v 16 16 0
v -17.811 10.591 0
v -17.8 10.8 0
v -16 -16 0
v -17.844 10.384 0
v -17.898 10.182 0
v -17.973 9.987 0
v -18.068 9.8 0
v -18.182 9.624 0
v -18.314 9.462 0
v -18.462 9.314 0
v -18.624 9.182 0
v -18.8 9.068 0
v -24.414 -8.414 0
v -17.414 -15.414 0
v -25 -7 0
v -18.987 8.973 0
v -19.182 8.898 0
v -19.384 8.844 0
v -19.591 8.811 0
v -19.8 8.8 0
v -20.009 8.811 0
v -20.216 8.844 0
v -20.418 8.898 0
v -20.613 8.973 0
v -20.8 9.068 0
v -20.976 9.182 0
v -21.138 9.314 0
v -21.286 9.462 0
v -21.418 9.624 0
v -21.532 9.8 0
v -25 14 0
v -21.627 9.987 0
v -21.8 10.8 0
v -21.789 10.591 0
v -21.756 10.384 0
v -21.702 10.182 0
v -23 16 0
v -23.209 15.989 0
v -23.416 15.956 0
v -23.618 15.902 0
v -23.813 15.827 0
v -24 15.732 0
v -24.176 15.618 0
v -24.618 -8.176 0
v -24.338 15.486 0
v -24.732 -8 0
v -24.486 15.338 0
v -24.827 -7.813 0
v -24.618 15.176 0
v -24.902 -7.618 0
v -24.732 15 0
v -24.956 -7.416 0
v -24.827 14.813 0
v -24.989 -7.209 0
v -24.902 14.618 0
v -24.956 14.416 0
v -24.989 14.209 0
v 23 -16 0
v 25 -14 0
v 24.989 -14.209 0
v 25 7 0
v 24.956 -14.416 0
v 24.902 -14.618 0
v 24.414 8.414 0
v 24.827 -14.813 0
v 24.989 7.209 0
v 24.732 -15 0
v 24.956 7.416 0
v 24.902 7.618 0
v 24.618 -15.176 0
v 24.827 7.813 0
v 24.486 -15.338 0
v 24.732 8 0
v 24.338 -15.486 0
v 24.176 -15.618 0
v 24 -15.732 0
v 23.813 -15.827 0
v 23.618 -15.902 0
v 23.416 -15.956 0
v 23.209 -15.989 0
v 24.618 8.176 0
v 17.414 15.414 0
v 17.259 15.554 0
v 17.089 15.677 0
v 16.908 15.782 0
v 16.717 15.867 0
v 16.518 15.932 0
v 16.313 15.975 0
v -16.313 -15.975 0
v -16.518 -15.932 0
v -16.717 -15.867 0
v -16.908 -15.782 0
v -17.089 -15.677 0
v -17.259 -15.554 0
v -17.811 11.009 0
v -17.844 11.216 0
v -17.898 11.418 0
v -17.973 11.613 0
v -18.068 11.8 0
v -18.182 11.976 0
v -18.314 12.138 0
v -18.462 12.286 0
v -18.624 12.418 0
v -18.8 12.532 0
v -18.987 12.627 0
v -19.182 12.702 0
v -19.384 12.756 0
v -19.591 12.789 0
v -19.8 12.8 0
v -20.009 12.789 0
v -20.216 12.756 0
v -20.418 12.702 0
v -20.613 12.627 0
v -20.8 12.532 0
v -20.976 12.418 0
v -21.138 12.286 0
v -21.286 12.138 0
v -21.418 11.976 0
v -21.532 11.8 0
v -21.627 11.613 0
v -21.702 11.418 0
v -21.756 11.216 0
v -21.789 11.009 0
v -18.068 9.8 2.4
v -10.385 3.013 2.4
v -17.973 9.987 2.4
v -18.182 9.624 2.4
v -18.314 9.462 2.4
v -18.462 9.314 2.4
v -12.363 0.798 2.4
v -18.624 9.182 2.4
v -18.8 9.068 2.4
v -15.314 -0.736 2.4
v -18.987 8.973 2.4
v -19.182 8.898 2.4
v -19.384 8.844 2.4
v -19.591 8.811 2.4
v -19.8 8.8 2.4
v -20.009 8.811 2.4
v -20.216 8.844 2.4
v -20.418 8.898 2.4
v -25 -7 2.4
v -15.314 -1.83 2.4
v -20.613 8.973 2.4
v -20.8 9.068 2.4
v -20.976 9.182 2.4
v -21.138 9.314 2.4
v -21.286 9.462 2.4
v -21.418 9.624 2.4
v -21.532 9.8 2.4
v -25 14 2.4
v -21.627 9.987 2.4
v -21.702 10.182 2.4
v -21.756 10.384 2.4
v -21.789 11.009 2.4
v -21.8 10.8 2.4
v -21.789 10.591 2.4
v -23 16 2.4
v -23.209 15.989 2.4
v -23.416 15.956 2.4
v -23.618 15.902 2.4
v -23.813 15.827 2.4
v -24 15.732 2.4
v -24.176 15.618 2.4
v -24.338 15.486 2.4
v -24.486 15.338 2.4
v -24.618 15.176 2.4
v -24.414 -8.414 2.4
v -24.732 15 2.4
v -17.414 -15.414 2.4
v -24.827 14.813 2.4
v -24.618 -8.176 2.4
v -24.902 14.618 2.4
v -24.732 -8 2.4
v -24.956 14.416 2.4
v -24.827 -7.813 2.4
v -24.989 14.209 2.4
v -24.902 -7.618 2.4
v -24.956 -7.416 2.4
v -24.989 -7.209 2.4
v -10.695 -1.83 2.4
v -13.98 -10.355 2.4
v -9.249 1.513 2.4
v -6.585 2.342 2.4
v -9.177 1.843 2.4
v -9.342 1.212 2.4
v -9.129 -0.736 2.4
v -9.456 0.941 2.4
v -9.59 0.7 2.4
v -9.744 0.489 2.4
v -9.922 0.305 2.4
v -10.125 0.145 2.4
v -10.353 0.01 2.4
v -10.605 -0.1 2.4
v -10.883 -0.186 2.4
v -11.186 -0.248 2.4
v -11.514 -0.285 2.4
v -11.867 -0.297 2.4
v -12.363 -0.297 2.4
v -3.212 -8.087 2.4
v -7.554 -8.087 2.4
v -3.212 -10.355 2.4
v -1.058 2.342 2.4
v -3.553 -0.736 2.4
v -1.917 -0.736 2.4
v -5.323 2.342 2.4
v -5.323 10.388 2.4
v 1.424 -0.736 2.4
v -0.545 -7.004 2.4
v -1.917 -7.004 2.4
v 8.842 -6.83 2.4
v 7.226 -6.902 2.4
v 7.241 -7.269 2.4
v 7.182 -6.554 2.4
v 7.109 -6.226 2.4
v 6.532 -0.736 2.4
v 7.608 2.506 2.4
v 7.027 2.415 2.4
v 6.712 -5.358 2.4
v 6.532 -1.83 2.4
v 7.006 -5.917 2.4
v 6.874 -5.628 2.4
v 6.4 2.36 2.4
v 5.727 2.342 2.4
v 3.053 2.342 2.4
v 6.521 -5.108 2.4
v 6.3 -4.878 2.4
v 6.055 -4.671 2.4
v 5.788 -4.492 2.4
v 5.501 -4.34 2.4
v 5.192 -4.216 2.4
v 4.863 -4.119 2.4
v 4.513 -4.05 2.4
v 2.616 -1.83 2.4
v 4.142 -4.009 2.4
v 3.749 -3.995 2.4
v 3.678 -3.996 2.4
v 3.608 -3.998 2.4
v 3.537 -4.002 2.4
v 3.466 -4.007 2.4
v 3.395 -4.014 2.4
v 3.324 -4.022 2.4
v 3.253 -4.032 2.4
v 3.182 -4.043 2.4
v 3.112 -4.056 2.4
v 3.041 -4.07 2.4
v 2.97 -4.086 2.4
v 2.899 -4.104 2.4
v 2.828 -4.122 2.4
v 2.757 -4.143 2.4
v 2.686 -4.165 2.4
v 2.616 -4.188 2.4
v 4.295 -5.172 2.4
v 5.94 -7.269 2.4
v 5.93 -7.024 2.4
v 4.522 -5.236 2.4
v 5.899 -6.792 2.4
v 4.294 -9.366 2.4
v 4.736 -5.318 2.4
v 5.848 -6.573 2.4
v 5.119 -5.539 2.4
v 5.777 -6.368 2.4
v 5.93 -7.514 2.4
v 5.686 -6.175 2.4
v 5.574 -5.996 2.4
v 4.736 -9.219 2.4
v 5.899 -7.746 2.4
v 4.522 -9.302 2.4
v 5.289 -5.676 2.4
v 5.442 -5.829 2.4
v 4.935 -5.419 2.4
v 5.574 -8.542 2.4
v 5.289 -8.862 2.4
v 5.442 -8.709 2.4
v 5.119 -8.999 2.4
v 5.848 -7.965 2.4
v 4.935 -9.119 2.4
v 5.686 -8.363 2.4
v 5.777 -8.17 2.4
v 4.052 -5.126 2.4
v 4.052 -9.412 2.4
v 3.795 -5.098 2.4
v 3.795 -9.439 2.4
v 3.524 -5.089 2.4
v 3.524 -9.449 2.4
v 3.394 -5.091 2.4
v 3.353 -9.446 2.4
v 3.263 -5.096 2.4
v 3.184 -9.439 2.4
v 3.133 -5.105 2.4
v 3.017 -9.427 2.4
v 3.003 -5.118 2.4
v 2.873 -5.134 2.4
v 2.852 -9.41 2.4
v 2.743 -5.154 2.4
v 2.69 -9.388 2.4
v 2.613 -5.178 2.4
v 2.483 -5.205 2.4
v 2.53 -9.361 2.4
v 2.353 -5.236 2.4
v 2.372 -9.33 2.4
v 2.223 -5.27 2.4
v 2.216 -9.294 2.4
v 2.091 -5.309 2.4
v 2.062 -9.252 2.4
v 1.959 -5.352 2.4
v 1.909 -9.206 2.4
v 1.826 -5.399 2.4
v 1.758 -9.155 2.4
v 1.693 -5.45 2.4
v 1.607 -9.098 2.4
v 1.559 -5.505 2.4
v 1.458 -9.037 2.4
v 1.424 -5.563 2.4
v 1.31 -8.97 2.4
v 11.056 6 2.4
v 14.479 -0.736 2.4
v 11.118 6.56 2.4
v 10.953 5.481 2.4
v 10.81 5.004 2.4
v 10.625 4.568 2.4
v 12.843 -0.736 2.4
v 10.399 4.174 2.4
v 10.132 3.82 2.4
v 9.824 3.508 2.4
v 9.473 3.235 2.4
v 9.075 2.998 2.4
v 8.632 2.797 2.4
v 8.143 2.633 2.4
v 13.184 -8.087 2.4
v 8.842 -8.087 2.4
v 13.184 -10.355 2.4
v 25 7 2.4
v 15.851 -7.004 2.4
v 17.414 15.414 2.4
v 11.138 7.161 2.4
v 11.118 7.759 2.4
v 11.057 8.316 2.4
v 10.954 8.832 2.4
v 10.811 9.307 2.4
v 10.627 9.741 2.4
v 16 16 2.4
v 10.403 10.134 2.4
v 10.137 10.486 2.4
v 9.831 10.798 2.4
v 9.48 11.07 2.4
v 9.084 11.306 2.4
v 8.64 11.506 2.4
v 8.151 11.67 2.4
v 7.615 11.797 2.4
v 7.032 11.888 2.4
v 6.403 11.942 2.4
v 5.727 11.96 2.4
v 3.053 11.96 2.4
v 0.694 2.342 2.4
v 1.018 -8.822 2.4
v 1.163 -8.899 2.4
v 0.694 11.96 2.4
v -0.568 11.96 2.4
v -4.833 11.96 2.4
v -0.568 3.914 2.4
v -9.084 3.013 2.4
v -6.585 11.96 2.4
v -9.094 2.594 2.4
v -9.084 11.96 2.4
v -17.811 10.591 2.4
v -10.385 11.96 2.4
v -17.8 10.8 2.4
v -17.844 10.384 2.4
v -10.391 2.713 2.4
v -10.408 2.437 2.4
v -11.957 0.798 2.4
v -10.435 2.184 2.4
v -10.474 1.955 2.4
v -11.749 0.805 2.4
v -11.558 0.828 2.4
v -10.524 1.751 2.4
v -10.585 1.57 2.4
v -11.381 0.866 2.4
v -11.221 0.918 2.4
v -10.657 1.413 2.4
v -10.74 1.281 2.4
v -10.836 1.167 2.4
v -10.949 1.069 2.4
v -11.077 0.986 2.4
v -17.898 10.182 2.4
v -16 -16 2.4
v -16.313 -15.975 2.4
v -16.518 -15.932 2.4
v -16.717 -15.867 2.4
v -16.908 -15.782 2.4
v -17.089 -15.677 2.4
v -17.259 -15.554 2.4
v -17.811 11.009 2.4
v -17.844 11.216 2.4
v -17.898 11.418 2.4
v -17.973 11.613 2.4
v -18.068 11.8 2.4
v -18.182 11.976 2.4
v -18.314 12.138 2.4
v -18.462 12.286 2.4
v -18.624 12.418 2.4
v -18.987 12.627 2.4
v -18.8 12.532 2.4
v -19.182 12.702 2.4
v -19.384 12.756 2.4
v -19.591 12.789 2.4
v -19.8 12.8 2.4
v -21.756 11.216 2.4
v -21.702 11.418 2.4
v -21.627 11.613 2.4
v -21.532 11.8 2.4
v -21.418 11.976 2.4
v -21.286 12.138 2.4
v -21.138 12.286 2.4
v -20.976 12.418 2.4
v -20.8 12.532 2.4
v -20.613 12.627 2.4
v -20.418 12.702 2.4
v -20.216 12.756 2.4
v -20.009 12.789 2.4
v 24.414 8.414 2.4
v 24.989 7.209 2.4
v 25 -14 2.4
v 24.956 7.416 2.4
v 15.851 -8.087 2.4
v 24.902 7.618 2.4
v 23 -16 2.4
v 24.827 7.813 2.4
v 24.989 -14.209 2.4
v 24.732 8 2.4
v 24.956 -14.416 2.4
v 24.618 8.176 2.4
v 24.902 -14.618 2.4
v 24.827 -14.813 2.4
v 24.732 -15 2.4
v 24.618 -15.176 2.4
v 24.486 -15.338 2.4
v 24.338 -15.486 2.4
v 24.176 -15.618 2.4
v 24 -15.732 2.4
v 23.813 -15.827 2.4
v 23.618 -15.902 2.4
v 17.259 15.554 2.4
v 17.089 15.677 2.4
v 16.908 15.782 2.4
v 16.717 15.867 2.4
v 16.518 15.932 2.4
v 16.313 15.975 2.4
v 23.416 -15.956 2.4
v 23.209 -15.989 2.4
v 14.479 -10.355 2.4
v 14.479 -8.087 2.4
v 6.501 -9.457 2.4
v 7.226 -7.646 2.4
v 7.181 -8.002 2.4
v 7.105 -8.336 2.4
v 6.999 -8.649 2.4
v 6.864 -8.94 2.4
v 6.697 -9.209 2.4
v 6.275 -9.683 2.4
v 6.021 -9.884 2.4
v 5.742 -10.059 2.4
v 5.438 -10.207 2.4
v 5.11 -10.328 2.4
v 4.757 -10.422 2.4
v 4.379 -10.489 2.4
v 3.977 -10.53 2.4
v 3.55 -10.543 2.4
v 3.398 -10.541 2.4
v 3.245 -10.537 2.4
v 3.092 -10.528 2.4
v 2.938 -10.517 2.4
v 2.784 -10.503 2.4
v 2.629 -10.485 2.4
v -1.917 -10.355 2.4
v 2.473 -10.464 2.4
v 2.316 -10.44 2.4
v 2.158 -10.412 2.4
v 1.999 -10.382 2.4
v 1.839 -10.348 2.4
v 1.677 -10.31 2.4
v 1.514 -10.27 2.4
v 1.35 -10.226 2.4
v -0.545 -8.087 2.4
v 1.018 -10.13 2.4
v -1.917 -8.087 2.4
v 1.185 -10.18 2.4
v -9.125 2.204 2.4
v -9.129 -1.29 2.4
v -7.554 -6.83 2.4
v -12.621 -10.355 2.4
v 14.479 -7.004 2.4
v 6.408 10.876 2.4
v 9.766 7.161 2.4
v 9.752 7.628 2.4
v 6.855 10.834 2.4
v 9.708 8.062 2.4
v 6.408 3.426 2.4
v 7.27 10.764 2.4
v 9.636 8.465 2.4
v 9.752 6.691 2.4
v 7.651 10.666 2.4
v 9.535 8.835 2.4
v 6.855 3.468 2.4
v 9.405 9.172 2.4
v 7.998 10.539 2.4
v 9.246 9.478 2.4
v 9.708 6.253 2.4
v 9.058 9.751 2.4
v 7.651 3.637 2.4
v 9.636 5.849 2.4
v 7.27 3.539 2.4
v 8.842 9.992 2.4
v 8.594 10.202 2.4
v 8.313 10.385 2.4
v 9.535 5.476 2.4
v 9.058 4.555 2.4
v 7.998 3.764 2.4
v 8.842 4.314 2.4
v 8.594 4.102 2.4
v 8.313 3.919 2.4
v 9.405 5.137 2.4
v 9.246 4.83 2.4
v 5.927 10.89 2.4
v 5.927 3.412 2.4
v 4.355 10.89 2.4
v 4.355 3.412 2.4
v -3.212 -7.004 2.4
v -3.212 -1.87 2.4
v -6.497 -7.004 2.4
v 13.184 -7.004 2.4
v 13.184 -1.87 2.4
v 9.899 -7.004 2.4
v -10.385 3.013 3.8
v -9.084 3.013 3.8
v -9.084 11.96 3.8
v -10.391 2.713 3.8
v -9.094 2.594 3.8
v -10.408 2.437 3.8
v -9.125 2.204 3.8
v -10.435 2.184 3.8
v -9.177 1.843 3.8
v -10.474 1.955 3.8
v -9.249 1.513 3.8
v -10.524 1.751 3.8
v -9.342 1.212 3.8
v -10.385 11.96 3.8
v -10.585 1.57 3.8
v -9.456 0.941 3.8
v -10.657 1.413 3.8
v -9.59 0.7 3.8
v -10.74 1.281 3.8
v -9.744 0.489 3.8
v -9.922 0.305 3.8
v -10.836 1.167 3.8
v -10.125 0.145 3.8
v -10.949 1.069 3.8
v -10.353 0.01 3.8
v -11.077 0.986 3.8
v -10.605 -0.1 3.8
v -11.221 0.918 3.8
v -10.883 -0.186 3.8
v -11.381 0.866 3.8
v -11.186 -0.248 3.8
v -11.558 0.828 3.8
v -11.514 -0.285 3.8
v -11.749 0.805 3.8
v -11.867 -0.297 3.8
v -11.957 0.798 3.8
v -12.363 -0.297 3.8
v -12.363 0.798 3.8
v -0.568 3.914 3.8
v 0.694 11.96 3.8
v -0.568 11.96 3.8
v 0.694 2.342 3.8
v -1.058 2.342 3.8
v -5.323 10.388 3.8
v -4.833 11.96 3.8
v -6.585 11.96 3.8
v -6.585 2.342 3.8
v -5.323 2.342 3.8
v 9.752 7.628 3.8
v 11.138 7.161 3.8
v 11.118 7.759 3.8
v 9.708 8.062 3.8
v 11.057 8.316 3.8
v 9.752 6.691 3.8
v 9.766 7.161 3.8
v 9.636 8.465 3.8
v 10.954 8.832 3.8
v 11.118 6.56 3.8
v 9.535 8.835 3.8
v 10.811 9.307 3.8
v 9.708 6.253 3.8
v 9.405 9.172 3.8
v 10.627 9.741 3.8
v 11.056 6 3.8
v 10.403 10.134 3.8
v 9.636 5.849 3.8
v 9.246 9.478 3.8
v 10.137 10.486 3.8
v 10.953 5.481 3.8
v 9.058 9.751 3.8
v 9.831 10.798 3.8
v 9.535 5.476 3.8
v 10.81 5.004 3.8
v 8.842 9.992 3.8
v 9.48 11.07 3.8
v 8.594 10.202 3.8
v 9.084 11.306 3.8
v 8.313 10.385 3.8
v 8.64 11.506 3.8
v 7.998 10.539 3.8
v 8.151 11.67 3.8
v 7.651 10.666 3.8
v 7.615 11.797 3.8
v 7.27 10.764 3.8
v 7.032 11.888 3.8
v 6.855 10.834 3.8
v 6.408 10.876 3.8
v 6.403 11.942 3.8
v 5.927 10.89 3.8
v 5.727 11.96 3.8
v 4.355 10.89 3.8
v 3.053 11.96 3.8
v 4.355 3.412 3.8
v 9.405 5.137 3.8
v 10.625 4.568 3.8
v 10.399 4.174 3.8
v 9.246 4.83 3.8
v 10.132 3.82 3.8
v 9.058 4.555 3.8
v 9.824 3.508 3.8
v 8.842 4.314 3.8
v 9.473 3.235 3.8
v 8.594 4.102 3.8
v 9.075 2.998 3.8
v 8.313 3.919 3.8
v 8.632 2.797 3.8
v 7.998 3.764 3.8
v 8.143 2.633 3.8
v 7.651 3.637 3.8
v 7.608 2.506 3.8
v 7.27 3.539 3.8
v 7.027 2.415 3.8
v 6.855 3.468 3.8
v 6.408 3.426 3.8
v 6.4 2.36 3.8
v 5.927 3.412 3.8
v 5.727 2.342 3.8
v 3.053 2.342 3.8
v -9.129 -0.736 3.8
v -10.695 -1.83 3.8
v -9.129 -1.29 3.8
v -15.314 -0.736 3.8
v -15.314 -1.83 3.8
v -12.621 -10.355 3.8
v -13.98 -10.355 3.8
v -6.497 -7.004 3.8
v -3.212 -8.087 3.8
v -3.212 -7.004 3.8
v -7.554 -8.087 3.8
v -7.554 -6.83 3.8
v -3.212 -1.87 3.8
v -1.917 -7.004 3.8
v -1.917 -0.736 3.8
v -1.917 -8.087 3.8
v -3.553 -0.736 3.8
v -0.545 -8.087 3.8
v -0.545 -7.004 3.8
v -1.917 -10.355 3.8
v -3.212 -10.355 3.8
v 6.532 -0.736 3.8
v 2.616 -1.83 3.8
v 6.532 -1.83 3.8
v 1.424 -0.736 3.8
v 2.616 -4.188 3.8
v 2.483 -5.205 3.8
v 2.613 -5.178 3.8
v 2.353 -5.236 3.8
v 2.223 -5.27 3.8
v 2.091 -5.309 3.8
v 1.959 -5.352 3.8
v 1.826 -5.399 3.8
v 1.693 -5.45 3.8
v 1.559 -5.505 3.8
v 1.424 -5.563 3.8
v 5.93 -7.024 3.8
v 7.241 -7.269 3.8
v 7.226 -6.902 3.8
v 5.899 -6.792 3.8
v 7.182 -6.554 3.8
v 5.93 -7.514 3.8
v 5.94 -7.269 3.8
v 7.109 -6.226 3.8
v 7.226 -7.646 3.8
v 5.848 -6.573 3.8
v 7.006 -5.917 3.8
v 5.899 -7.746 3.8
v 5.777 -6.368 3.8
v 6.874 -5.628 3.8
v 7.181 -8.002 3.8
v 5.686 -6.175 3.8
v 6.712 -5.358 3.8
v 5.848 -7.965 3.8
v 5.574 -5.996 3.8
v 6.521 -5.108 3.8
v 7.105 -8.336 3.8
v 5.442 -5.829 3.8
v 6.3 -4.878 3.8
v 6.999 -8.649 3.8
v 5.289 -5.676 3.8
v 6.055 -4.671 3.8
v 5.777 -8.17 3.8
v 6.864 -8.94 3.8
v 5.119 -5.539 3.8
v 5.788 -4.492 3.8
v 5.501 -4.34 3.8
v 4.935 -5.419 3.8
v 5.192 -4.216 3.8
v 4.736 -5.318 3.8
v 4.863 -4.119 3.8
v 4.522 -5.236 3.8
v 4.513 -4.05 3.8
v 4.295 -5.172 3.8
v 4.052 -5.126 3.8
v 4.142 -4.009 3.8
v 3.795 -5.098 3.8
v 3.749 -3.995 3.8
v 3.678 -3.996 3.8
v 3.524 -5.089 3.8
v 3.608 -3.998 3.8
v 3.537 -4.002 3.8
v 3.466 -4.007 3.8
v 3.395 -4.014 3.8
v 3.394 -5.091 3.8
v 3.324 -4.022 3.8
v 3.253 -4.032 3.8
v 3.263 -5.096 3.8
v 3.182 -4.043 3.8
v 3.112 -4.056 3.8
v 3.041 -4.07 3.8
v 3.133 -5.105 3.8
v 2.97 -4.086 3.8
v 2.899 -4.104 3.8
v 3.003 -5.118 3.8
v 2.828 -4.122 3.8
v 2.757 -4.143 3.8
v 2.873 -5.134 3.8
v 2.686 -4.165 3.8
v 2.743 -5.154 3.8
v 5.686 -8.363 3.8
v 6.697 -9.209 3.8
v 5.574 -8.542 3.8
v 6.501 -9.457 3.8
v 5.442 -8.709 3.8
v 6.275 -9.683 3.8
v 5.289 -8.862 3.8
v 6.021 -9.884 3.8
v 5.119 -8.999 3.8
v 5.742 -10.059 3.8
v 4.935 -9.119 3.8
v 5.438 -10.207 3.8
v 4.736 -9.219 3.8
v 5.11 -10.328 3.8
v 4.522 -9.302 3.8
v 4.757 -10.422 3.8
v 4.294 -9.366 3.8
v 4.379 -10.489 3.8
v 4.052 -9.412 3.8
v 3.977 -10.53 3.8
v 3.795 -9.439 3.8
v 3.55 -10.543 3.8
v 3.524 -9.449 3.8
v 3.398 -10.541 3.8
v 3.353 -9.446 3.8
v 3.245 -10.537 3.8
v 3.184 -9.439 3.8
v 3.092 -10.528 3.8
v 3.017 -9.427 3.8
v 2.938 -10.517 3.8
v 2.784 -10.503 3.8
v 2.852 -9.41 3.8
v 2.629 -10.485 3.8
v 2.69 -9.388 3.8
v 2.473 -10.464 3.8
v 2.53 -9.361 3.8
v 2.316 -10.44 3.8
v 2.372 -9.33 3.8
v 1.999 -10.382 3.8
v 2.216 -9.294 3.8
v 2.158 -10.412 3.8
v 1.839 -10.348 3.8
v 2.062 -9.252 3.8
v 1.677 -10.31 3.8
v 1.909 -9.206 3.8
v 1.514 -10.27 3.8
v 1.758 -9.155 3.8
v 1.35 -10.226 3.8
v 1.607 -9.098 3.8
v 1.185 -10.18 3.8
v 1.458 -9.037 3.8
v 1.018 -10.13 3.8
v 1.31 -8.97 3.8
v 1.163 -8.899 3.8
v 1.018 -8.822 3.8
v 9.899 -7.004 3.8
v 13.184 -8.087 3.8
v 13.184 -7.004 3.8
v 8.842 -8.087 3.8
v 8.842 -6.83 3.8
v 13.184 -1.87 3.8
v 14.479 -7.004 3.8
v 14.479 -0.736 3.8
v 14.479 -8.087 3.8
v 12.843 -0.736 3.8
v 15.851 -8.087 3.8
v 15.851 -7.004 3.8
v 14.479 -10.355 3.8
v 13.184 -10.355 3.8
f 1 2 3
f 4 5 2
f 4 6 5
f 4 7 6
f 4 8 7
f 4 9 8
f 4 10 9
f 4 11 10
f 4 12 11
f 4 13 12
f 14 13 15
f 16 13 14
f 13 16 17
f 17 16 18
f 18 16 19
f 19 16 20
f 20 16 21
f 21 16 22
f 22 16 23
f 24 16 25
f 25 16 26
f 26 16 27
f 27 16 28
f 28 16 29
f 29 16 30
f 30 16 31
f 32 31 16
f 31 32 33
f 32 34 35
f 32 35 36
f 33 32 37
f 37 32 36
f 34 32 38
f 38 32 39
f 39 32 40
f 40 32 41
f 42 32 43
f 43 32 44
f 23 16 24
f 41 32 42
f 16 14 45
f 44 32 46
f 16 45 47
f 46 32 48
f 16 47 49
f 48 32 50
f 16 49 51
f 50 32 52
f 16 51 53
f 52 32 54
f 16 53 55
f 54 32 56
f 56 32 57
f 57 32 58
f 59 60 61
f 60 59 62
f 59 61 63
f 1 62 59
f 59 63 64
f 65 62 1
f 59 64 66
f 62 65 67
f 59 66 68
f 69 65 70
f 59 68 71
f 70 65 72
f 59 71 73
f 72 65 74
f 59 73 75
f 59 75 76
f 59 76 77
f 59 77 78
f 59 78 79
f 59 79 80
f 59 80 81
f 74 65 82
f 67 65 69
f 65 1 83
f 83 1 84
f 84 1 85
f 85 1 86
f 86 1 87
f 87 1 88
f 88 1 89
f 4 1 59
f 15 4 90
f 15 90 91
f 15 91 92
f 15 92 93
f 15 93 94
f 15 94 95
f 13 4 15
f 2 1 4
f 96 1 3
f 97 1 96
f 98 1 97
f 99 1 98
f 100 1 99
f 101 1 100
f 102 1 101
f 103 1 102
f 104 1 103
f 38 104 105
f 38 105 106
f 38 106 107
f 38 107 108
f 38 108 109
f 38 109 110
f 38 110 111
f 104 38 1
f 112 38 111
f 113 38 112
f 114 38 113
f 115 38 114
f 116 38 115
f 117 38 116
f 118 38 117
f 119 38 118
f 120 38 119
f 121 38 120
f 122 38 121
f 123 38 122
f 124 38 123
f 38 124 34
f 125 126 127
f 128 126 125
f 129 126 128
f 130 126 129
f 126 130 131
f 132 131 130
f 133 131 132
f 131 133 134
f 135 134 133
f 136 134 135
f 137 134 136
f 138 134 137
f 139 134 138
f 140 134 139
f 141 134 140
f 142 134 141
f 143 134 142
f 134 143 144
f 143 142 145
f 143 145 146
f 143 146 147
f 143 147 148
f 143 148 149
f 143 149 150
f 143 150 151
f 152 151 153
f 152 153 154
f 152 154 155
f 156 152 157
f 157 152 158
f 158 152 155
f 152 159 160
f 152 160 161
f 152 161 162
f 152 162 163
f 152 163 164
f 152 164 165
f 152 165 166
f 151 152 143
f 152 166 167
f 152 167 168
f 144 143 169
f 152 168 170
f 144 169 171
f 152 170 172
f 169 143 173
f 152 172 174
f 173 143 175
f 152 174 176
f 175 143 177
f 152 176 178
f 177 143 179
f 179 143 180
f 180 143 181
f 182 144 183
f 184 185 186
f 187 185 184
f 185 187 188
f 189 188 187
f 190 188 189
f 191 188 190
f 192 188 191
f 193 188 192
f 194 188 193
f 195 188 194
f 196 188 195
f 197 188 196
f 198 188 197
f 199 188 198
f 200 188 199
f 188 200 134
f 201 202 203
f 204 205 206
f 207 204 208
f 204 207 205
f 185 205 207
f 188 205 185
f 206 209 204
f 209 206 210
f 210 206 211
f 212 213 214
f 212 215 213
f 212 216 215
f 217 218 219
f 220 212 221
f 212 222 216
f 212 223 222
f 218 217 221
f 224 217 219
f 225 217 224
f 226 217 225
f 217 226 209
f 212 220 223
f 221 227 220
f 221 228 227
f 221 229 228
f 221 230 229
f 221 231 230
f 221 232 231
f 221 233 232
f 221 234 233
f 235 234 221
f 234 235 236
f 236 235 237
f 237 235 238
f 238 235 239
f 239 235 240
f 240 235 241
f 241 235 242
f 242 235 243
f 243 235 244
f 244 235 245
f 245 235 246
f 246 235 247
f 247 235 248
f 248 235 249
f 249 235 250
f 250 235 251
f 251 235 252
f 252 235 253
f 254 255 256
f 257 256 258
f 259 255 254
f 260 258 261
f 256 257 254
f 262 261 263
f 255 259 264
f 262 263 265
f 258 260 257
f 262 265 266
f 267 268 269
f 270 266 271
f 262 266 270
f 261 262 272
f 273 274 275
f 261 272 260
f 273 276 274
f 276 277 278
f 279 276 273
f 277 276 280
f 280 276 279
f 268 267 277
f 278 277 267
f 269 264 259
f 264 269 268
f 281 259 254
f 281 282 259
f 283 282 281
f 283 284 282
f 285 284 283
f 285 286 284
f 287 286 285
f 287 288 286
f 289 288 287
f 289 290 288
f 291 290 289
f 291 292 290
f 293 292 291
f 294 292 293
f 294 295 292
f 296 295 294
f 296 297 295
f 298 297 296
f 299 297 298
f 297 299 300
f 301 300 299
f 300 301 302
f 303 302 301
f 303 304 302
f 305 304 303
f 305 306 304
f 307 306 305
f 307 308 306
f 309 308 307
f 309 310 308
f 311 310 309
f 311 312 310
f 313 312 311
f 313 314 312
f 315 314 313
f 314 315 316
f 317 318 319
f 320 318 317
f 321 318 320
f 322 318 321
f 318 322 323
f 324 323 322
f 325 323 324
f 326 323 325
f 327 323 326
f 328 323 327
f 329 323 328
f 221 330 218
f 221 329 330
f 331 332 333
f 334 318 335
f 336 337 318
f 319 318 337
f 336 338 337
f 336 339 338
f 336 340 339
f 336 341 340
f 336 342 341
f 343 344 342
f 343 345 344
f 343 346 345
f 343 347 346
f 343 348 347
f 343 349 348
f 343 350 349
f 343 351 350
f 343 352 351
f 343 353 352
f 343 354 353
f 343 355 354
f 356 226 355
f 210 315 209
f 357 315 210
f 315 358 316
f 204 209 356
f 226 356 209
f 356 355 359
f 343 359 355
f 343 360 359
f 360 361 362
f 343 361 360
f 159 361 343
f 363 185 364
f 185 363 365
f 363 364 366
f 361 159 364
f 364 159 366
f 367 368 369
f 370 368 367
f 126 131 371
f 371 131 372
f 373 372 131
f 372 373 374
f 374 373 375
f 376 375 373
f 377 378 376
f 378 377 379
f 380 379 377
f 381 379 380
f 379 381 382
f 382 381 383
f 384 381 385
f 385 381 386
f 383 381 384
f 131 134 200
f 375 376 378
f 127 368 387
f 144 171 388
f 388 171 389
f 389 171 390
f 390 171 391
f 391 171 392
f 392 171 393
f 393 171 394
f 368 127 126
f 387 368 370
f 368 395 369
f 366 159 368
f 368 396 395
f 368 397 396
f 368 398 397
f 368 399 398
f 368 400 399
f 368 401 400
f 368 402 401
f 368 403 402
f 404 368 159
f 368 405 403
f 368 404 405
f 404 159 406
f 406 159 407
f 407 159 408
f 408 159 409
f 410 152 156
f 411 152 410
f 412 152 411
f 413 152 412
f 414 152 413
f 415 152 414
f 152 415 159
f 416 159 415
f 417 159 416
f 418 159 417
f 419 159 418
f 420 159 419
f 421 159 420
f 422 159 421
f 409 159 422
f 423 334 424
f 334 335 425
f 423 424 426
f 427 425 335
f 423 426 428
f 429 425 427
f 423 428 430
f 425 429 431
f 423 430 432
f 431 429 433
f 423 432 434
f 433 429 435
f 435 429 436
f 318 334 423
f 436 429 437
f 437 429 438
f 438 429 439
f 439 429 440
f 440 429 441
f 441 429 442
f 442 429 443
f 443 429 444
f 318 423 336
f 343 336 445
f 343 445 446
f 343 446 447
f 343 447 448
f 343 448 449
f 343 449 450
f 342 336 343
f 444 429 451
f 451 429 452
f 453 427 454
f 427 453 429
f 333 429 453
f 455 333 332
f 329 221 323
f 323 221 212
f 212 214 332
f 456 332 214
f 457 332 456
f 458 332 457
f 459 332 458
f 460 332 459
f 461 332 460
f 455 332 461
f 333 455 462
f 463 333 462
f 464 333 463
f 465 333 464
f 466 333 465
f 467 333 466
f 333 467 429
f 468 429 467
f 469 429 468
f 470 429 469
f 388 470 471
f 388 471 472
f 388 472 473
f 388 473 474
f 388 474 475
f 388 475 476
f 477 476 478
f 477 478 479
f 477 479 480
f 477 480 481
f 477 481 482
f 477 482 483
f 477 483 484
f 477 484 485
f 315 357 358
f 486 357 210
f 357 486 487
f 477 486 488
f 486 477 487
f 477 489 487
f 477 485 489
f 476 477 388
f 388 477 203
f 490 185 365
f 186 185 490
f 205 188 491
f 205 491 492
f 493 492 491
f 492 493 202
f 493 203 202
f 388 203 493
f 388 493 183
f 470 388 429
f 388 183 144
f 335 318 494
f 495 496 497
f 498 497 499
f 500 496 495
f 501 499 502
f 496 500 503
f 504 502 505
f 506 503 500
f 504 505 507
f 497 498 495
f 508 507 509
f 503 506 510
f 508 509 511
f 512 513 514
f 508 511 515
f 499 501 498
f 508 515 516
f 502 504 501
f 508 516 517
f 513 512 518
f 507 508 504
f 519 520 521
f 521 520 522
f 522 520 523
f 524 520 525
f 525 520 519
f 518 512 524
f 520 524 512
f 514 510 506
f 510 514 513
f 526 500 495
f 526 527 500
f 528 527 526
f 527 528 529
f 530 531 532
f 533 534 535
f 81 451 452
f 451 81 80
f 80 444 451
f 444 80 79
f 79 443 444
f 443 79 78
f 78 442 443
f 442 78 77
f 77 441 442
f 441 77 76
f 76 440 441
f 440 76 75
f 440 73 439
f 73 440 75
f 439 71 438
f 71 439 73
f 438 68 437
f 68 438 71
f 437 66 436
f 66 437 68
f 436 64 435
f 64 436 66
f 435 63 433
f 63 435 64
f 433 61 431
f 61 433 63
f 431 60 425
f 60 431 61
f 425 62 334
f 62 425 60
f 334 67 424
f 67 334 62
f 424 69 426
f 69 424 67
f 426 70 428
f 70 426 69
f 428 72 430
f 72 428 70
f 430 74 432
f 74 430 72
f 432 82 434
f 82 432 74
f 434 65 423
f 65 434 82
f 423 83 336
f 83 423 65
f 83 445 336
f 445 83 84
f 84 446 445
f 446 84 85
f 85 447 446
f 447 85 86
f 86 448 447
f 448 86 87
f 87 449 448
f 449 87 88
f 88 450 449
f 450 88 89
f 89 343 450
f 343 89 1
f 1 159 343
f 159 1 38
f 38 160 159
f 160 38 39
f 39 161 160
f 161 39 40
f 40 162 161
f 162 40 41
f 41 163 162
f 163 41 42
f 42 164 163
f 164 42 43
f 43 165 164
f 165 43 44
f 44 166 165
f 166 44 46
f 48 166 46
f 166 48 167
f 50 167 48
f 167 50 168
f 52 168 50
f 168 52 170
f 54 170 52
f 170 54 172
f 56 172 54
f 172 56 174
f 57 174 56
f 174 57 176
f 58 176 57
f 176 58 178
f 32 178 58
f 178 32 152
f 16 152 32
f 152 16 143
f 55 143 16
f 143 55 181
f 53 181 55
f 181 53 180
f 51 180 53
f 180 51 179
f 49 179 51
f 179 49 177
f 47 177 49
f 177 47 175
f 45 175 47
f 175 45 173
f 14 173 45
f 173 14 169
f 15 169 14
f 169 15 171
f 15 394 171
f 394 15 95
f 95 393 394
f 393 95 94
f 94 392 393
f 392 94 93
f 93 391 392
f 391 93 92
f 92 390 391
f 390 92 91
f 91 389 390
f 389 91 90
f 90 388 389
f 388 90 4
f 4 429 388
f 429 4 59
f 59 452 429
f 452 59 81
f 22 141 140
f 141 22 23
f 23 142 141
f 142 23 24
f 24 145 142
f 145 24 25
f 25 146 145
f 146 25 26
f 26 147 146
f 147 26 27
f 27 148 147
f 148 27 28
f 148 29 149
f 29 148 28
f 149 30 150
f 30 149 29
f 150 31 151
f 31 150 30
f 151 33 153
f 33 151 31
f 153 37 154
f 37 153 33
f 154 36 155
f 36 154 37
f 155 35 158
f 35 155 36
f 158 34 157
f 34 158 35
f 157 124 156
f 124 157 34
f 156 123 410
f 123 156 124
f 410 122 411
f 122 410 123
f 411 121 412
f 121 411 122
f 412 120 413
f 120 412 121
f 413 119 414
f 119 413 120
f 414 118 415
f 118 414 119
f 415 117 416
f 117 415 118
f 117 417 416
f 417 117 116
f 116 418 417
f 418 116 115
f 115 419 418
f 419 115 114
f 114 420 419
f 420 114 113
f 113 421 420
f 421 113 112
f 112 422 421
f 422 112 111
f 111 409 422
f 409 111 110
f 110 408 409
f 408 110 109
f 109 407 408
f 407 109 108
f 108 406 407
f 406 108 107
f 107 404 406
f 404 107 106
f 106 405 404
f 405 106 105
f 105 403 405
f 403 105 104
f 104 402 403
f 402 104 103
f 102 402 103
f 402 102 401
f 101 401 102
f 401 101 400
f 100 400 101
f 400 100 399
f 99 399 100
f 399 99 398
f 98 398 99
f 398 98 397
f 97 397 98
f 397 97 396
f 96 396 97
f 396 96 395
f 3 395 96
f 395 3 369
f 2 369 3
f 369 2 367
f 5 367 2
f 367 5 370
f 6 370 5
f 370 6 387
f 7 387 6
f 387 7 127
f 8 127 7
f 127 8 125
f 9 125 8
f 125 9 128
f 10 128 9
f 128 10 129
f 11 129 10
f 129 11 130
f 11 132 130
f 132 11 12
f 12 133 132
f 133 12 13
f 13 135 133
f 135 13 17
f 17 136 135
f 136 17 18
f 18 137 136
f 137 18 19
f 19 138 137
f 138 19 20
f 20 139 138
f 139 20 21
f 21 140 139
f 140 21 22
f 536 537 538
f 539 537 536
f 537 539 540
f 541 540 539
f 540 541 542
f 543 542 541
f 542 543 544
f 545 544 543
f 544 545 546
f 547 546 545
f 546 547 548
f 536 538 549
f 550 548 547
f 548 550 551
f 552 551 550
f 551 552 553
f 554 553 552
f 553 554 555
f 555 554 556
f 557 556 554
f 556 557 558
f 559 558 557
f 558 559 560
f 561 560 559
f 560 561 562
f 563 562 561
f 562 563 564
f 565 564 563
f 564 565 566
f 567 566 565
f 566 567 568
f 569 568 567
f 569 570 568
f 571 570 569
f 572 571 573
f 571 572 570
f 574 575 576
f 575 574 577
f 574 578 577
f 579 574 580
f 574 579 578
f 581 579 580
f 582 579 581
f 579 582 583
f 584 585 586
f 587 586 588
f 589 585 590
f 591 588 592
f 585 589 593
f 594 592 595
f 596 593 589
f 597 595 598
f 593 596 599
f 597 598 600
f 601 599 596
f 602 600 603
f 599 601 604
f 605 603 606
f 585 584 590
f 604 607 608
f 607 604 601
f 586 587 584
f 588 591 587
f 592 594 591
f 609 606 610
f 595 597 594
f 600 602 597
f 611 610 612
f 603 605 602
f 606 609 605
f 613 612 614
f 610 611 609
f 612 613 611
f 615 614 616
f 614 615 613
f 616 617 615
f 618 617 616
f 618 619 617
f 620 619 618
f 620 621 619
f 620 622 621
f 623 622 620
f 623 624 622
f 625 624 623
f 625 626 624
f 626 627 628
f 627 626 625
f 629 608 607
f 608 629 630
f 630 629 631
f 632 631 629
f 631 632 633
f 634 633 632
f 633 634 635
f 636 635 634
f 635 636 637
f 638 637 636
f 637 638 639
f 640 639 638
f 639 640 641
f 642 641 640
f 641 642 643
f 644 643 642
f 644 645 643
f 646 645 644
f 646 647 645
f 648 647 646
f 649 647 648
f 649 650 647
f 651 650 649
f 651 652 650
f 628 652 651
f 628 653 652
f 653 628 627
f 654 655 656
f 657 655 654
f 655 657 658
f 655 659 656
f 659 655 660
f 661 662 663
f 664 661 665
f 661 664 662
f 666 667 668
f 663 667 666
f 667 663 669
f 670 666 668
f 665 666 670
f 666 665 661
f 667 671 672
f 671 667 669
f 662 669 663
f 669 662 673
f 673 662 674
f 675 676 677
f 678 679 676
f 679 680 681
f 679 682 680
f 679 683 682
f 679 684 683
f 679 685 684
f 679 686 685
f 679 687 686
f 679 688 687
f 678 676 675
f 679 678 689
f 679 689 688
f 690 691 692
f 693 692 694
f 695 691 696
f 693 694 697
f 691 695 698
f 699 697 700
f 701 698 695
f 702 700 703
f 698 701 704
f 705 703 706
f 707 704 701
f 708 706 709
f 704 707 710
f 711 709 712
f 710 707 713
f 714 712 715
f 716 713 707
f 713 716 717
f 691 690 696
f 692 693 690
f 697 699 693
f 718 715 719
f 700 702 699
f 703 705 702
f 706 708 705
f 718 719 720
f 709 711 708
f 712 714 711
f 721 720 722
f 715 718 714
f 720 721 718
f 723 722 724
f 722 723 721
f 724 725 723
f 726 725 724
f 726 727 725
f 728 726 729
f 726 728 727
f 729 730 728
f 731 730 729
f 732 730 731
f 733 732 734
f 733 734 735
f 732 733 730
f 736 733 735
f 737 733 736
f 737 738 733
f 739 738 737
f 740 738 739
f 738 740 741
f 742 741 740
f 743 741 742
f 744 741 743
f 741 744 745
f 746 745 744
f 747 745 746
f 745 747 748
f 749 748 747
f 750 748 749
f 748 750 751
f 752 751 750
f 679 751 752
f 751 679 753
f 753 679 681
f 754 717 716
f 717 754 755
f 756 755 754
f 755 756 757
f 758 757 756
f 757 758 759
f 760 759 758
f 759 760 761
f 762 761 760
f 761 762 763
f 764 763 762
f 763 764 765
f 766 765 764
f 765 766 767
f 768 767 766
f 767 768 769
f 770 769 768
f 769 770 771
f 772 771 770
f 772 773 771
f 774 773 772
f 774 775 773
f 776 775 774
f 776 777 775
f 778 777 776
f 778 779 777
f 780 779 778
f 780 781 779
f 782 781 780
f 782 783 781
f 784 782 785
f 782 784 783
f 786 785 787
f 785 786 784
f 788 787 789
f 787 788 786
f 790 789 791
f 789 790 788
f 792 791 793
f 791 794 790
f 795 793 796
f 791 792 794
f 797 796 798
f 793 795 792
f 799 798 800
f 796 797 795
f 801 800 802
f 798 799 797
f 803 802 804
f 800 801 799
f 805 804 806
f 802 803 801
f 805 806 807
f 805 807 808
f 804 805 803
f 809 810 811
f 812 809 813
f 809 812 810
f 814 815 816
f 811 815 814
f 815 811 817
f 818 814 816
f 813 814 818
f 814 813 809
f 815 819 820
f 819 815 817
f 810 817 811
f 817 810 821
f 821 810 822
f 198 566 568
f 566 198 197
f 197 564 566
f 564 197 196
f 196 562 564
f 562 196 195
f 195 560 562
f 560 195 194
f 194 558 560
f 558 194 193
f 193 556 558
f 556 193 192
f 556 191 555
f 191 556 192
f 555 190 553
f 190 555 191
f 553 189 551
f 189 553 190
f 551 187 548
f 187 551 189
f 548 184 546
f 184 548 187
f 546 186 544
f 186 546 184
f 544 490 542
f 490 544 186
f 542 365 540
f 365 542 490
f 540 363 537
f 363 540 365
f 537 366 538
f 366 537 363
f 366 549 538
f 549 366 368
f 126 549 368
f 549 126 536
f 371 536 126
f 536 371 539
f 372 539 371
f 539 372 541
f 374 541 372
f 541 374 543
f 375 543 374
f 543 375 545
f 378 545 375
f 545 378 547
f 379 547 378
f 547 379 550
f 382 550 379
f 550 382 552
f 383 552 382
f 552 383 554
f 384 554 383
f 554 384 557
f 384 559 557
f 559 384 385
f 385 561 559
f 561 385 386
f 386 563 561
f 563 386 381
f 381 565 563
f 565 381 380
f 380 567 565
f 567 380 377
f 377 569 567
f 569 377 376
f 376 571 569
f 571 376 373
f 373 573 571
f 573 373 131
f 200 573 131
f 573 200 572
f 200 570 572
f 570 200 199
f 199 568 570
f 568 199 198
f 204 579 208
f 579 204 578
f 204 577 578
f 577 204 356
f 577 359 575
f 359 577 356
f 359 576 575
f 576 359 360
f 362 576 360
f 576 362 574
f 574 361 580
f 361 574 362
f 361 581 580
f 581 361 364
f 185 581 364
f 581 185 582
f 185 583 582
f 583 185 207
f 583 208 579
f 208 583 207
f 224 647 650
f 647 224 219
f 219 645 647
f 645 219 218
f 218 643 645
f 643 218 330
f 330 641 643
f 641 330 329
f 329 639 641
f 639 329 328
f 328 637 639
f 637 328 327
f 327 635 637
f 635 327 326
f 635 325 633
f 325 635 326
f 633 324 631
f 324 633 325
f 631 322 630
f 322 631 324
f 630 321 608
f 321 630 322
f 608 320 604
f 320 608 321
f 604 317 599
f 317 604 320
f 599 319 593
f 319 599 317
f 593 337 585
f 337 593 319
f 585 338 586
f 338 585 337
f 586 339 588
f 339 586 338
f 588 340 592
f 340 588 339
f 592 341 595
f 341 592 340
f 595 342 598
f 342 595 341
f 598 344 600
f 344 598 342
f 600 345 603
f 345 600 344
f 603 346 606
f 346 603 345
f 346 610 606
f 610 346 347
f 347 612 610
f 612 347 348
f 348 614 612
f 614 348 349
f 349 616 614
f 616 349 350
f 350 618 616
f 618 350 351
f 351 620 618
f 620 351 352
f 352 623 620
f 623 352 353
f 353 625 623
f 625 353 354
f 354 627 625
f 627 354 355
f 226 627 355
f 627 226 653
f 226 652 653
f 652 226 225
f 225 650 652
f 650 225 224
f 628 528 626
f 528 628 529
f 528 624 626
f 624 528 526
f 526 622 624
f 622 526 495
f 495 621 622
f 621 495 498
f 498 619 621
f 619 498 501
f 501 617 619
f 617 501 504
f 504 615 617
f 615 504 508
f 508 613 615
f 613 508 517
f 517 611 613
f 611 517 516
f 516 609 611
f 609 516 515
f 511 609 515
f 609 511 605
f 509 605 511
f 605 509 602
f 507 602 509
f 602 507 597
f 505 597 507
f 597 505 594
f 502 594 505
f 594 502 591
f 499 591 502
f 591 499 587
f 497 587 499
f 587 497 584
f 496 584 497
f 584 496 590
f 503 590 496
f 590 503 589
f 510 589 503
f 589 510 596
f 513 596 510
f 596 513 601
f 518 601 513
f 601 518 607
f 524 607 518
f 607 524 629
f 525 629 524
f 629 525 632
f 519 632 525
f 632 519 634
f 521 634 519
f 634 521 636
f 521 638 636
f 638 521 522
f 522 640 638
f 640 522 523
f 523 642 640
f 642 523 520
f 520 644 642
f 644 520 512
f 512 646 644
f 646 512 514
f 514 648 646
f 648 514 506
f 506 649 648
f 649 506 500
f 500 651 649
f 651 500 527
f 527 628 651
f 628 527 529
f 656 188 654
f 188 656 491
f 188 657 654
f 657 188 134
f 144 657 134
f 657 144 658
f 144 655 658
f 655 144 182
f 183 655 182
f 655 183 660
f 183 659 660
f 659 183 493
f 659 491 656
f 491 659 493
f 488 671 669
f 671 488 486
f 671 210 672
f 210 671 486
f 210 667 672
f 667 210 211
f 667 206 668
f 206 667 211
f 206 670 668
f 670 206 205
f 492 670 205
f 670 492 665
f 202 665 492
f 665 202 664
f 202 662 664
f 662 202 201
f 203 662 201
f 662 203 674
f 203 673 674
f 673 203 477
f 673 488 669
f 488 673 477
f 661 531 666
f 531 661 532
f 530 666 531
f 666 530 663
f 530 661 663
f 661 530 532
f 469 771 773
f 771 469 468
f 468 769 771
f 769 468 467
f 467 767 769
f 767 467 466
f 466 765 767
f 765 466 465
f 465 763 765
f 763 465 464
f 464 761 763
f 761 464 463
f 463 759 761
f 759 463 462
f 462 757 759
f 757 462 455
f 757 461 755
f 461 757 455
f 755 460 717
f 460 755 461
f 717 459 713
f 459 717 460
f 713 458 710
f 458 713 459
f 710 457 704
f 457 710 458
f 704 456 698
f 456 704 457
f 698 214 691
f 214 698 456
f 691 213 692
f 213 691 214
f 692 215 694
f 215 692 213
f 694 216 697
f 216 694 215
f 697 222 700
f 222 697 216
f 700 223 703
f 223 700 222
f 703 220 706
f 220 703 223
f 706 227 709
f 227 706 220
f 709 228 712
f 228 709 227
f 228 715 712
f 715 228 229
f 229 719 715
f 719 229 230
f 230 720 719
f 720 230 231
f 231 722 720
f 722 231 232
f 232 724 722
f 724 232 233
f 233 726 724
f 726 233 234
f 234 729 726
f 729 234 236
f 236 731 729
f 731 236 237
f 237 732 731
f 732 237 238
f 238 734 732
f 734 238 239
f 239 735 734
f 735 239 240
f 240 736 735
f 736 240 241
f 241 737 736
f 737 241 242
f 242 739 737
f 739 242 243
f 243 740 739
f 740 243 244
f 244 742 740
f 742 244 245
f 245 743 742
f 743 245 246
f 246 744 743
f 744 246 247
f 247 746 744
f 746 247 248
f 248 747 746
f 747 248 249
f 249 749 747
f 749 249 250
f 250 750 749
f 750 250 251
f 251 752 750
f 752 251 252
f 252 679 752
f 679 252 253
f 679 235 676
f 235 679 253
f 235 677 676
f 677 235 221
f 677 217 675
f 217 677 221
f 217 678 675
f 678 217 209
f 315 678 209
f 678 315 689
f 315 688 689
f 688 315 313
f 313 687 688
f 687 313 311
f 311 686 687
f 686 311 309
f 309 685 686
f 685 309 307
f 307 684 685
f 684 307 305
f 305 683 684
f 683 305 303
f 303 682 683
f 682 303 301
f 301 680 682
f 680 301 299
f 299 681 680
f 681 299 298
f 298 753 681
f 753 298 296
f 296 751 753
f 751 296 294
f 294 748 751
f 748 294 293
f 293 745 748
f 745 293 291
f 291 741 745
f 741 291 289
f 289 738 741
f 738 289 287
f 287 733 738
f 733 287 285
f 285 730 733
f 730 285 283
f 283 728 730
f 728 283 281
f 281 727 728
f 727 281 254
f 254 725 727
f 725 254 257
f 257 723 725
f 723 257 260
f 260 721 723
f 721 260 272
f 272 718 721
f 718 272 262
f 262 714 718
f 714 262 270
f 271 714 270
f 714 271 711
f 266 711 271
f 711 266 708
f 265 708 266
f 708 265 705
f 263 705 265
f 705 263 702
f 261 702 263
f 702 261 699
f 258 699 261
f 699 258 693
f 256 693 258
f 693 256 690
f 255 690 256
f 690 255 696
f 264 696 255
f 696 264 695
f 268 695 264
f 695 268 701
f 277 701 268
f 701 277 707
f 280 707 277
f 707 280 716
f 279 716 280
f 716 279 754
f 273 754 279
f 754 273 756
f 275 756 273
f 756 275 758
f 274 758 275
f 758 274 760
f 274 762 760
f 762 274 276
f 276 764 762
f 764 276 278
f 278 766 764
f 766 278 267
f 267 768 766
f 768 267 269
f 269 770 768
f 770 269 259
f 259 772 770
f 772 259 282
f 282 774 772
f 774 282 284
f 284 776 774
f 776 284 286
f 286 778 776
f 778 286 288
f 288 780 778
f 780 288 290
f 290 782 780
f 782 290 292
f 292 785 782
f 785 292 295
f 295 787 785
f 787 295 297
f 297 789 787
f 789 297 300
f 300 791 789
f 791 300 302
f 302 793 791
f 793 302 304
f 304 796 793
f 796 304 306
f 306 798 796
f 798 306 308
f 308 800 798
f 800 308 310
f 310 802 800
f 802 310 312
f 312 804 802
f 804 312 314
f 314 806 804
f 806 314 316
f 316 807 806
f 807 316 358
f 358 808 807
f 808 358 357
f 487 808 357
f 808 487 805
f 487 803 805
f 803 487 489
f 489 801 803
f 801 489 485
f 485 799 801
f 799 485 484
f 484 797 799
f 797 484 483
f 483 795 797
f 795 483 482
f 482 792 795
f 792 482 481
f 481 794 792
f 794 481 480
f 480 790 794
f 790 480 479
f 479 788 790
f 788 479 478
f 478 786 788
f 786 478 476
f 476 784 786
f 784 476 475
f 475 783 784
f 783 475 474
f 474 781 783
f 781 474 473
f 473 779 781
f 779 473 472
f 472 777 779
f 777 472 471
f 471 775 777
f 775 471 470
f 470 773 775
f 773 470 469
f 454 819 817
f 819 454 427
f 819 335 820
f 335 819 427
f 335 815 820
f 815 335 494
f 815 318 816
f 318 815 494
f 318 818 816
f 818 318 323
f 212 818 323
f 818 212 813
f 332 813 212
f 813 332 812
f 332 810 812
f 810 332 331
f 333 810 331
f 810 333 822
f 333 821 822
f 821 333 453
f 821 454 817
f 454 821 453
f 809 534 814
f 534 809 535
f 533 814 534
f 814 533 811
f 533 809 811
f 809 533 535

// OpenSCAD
// =========================================================
// AMMARE.3D - KEYCHAIN NOMBOR PLAT MALAYSIA (SAIZ BESAR & IDEAL)
// =========================================================

/* [1. Pilihan Cetakan & Gaya] */
Pilihan_Cetak = "Semua"; // ["Semua": Preview Penuh, "Tapak Sahaja": Tapak Kosong, "Teks Sahaja": Teks & Border]
Gaya_Teks = "Timbul"; // ["Timbul", "Tenggelam"]
Tambah_Border = false; 


/* [2. Reka Bentuk & Saiz Tapak (Design A - F)] */
Bentuk_Plat = "Design C"; // ["Design A": "Design A (Perisai/Trapezoid)", "Design B": "Design B (Petak Bucu Bulat 2 Baris)", "Design C": "Design C (Potong 2 Bucu)", "Design D": "Design D (Potong 4 Bucu)", "Design E": "Design E (Memanjang Potong Bucu)", "Design F": "Design F (Memanjang Petak Penuh)"]

Mod_Baris = "Auto"; // ["Auto": "Ikut Design (A-D: 2 Baris, E-F: 1 Baris)", "1 Baris": "Paksa 1 Baris", "2 Baris": "Paksa 2 Baris"]

// Lebar & Tinggi untuk Plat 2 Baris (Design A - D) - Saiz baru lebih mantap!
Lebar_Plat_2_Baris = 50; // [35:1:80]
Tinggi_Plat_2_Baris = 32; // [20:1:50]

// Lebar & Tinggi untuk Plat 1 Baris (Design E & F) - Sebaya keychain "Darling"
Lebar_Plat_1_Baris = 65; // [45:1:90]
Tinggi_Plat_1_Baris = 20; // [12:1:35]


/* [3. Teks Nombor Plat] */
Teks_Atas = "JND";
Teks_Bawah = "7454";
Teks_Satu_Baris = "SD 4723 Y";

Nama_Fon = "Arial Black:style=Regular"; // ["Arial Black:style=Regular", "Arial:style=Bold", "Impact:style=Regular", "Bebas Neue:style=Regular", "Archivo Black:style=Regular", "Agency FB:style=Bold","CharlesWright-Bold"]

// Saiz huruf untuk 2 Baris (Dibesarkan dari 7.5 ke 9.5)
Saiz_Teks = 9.5; // [4:0.5:18]

// Saiz huruf untuk 1 Baris (Dibesarkan dari 5.5 ke 7.5)
Saiz_Teks_1_Baris = 7.5; // [3:0.5:15]

// Jarak antara baris atas dan bawah (Dibesarkan dari 9.0 ke 11.5)
Jarak_Baris = 11.5; // [5:0.5:25]

Jarak_Huruf = 1.0; // [0.8:0.05:1.5]
Anjakan_Teks_X = 0.0; // [-15:0.5:15]
Anjakan_Teks_Y = 0.0; // [-15:0.5:15]


/* [4. Ketebalan & Ukuran (mm)] */
Tebal_Tapak = 2.4;  // Ditebalkan sedikit supaya lebih solid
Tebal_Teks = 1.4;
Tebal_Border = 1.5; 
Jejari_Bucu = 2.0;  


/* [5. Lubang Keychain (Bucu Kiri Atas)] */
Ada_Lubang = true;
Saiz_Lubang = 4.0; // [2:0.2:6]
Anjakan_Lubang_X = 0.0; // [-5:0.5:5]
Anjakan_Lubang_Y = 0.0; // [-5:0.5:5]


/* [6. Warna Preview] */
Warna_Tapak = "#111111"; // ["#111111": "Hitam", "#FFFFFF": "Putih", "#FF0000": "Merah", "#90EE90": "Hijau Cair", "#800080": "Purple", "#0000FF": "Biru", "#FFFF00": "Kuning", "#FFA500": "Oren", "#FFC0CB": "Pink"]
Warna_Teks = "#FFFFFF"; // ["#FFFFFF": "Putih", "#111111": "Hitam", "#FF0000": "Merah", "#90EE90": "Hijau Cair", "#800080": "Purple", "#0000FF": "Biru", "#FFFF00": "Kuning", "#FFA500": "Oren", "#FFC0CB": "Pink"]

/* [Hidden] */
$fn = 60;

// --- LOGIK PENENTUAN SAIZ & BARIS AUTOMATIK ---
adalah_plat_panjang = (Bentuk_Plat == "Design E" || Bentuk_Plat == "Design F");
adalah_1_baris = (Mod_Baris == "1 Baris") || (Mod_Baris == "Auto" && adalah_plat_panjang);

Lebar_Plat = adalah_plat_panjang ? Lebar_Plat_1_Baris : Lebar_Plat_2_Baris;
Tinggi_Plat = adalah_plat_panjang ? Tinggi_Plat_1_Baris : Tinggi_Plat_2_Baris;

// Kedudukan automatik lubang di Bucu Kiri Atas
offset_lubang_x = (Bentuk_Plat == "Design A") ? 6.5 : (adalah_plat_panjang ? 4.8 : 5.2);
offset_lubang_y = adalah_plat_panjang ? 4.8 : 5.2;

lubang_x = -Lebar_Plat/2 + offset_lubang_x + Anjakan_Lubang_X;
lubang_y = Tinggi_Plat/2 - offset_lubang_y + Anjakan_Lubang_Y;


// --- MODUL 2D: BENTUK TAPAK (DESIGN A - F) ---
module bentuk_tapak_2d() {
    w = Lebar_Plat / 2 - Jejari_Bucu;
    h = Tinggi_Plat / 2 - Jejari_Bucu;
    
    offset(r = Jejari_Bucu) {
        if (Bentuk_Plat == "Design A") {
            polygon(points=[
                [-w, h],
                [w, h],
                [w - 4.5, -h + 3.0],
                [0, -h],
                [-w + 4.5, -h + 3.0]
            ]);
        } 
        else if (Bentuk_Plat == "Design B") {
            square([w * 2, h * 2], center = true);
        } 
        else if (Bentuk_Plat == "Design C") {
            c = 7.0;
            polygon(points=[
                [-w, h],
                [w - c, h],
                [w, h - c],
                [w, -h],
                [-w + c, -h],
                [-w, -h + c]
            ]);
        } 
        else if (Bentuk_Plat == "Design D") {
            c = 5.5;
            polygon(points=[
                [-w + c, h],
                [w - c, h],
                [w, h - c],
                [w, -h + c],
                [w - c, -h],
                [-w + c, -h],
                [-w, -h + c],
                [-w, h - c]
            ]);
        } 
        else if (Bentuk_Plat == "Design E") {
            c = 4.5;
            polygon(points=[
                [-w, h],
                [w - c, h],
                [w, h - c],
                [w, -h],
                [-w + c, -h],
                [-w, -h + c]
            ]);
        }
        else if (Bentuk_Plat == "Design F") {
            square([w * 2, h * 2], center = true);
        }
    }
}

// --- MODUL 2D: SUSUNAN TEKS ---
module bentuk_teks_2d() {
    auto_anjak_x = (adalah_1_baris && Ada_Lubang) ? 1.5 : 0.0;
    
    translate([Anjakan_Teks_X + auto_anjak_x, Anjakan_Teks_Y, 0]) {
        if (adalah_1_baris) {
            text(Teks_Satu_Baris, size = Saiz_Teks_1_Baris, font = Nama_Fon, spacing = Jarak_Huruf, halign = "center", valign = "center");
        } else {
            translate([0, Jarak_Baris / 2, 0])
                text(Teks_Atas, size = Saiz_Teks, font = Nama_Fon, spacing = Jarak_Huruf, halign = "center", valign = "center");
            translate([0, -Jarak_Baris / 2, 0])
                text(Teks_Bawah, size = Saiz_Teks, font = Nama_Fon, spacing = Jarak_Huruf, halign = "center", valign = "center");
        }
    }
}

// --- MODUL 2D: BINGKAI (BORDER) ---
module bentuk_border_2d() {
    if (Tambah_Border) {
        difference() {
            bentuk_tapak_2d();
            offset(r = -Tebal_Border) bentuk_tapak_2d();
        }
    }
}

// --- MODUL 2D: GABUNGAN TIMBUL (TEKS + BORDER) ---
module elemen_timbul_2d() {
    difference() {
        union() {
            bentuk_teks_2d();
            bentuk_border_2d();
        }
        if (Ada_Lubang) {
            translate([lubang_x, lubang_y, 0])
                circle(d = Saiz_Lubang + 1.5);
        }
    }
}

// =========================================================
// BINAAN 3D UTAMA
// =========================================================
union() {
    if (Pilihan_Cetak == "Semua" || Pilihan_Cetak == "Tapak Sahaja") {
        color(Warna_Tapak)
        difference() {
            linear_extrude(height = Tebal_Tapak) {
                difference() {
                    bentuk_tapak_2d();
                    if (Ada_Lubang) {
                        translate([lubang_x, lubang_y, 0])
                            circle(d = Saiz_Lubang);
                    }
                }
            }
            if (Gaya_Teks == "Tenggelam") {
                translate([0, 0, Tebal_Tapak - Tebal_Teks])
                linear_extrude(height = Tebal_Teks + 0.1) {
                    elemen_timbul_2d();
                }
            }
        }
    }

    if (Gaya_Teks == "Timbul" && (Pilihan_Cetak == "Semua" || Pilihan_Cetak == "Teks Sahaja")) {
        z_pos = (Pilihan_Cetak == "Semua") ? Tebal_Tapak : 0;
        color(Warna_Teks)
        translate([0, 0, z_pos])
        linear_extrude(height = Tebal_Teks) {
            elemen_timbul_2d();
        }
    }
}
